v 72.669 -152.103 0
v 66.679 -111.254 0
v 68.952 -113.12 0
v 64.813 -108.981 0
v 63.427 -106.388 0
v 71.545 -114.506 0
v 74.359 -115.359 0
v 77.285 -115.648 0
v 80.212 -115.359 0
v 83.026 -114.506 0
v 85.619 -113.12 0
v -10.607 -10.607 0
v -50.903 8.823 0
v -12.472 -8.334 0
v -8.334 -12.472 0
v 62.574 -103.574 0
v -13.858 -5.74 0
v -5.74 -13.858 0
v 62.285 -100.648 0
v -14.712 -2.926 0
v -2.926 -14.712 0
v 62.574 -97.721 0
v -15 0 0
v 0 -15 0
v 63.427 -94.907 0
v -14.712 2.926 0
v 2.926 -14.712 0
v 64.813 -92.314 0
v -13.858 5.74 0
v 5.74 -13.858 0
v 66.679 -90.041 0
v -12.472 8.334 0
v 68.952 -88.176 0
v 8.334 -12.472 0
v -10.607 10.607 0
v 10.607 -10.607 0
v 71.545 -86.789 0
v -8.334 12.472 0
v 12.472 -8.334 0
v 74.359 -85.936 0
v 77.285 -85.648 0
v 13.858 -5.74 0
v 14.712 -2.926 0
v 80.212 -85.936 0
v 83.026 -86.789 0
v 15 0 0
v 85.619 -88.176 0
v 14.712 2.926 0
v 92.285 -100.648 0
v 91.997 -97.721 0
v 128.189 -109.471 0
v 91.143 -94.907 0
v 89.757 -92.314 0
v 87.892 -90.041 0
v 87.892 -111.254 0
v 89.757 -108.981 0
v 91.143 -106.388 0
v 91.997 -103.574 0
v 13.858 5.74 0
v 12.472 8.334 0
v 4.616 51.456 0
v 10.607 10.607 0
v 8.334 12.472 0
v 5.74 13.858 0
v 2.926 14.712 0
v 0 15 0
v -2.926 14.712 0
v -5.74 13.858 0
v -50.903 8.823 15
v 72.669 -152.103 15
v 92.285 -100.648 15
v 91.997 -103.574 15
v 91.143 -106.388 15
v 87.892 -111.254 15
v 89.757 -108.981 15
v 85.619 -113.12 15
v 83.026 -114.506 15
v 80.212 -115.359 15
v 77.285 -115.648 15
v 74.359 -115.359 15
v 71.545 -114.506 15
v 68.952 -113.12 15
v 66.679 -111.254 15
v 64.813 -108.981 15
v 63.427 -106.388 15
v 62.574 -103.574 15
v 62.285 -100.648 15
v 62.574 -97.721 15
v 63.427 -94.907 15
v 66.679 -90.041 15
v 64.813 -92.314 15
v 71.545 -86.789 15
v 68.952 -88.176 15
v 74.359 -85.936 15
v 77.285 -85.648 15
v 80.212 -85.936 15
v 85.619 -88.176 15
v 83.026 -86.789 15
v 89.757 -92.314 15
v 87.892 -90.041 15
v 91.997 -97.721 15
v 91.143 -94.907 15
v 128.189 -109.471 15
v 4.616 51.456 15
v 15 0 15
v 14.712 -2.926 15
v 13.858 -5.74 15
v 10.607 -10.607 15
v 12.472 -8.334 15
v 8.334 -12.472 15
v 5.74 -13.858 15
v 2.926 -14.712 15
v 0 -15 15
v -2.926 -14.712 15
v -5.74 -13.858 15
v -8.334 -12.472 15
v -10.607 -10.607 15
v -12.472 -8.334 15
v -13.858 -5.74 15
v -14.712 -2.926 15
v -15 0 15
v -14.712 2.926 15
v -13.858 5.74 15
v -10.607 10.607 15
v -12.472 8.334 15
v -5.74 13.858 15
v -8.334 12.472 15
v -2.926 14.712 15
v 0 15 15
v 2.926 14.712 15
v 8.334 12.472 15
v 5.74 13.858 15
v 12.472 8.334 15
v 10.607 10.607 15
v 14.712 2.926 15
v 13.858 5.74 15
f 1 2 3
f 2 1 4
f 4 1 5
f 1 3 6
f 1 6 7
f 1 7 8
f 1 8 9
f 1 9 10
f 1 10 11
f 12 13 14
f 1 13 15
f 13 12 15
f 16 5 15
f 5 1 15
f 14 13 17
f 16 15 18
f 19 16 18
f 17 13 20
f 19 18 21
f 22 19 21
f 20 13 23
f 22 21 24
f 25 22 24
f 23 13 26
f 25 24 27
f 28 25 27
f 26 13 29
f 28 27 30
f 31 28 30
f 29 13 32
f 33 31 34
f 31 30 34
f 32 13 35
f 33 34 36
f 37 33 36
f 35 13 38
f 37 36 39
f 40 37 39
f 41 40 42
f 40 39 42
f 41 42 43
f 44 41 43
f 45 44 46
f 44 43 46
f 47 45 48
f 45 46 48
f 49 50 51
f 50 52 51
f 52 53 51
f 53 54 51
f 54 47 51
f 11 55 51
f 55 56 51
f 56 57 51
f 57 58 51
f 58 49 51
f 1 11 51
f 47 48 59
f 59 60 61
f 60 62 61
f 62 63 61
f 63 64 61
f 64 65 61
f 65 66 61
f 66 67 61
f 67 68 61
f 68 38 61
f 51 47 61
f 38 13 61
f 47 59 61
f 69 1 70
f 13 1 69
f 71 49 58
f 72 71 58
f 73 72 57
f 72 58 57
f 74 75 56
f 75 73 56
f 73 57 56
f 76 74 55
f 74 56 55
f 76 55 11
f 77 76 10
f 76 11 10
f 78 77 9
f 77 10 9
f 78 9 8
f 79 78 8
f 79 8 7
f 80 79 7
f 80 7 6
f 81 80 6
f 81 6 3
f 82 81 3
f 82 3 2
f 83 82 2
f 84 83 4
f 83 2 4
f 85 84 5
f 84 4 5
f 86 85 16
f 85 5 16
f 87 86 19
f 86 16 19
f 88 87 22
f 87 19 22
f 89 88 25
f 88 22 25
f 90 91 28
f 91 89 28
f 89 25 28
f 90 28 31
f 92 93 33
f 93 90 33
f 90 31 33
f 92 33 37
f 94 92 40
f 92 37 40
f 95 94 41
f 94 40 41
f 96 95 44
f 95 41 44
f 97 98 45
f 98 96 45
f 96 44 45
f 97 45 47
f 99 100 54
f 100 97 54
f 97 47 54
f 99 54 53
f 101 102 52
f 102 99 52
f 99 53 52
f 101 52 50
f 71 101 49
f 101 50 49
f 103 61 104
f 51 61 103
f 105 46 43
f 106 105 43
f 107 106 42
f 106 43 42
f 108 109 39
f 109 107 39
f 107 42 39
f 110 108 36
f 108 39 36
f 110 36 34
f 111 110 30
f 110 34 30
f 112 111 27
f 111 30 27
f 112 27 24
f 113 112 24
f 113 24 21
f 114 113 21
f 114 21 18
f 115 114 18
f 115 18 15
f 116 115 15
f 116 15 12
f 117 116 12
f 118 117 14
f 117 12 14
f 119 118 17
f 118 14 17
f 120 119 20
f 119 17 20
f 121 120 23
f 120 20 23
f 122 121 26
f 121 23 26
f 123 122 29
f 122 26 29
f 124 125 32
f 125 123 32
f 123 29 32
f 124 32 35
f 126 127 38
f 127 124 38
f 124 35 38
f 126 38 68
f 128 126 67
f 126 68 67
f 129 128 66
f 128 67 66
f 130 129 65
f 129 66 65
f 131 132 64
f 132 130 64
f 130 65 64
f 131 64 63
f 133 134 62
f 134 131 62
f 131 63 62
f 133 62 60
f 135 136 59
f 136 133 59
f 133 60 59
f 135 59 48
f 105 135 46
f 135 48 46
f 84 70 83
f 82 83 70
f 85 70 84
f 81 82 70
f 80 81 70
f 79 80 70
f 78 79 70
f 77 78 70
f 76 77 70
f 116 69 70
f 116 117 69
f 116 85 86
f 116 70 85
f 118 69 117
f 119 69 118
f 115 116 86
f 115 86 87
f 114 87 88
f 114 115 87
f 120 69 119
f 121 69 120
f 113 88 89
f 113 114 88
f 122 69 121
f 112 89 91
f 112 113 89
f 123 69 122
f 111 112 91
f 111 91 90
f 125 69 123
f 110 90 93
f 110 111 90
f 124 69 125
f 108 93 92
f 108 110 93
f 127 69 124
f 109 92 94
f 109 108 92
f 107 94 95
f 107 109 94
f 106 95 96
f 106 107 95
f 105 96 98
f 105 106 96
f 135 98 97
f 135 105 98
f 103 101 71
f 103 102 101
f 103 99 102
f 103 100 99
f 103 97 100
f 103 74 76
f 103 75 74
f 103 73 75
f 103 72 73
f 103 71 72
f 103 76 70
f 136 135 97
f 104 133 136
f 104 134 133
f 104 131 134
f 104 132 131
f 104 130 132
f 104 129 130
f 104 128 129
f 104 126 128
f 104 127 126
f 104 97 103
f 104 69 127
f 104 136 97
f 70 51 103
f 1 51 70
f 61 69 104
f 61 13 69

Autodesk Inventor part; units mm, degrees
ref_plane "YZ Plane" through (0, 0, 0) normal (1, 0, 0) x (0, 1, 0)
ref_plane "XZ Plane" through (0, 0, 0) normal (0, 1, 0) x (-1, 0, 0)
ref_plane "XY Plane" through (0, 0, 0) normal (0, 0, 1) x (1, 0, 0)
sketch "Sketch1" plane through (0, 0, 0) normal (0, 0, 1) x (1, 0, 0)
  circle A0 centre (0, 0) radius 15 projected
  circle A1 centre (77.2853, -100.6476) radius 15 projected
  line L0 (0, 0) -> (77.2853, -100.6476) construction
  line L1 (4.6165, 51.4557) -> (140.1218, -125.0109) construction
  line L2 (-50.9034, 8.823) -> (49.7593, -122.2685) construction
  line L3 (11.1166, -71.9447) -> (66.6365, -29.312) construction
  line L4 (-50.9034, 8.823) -> (4.6165, 51.4557) construction
  line L5 (82.3144, -169.4001) -> (140.1218, -125.0109) construction
  line L6 (-50.9034, 8.823) -> (4.6165, 51.4557)
  line L7 (4.6165, 51.4557) -> (128.1887, -109.4706)
  line L8 (128.1887, -109.4706) -> (72.6688, -152.1033)
  line L9 (72.6688, -152.1033) -> (-50.9034, 8.823)
  point P0 (0, 0)
  dimension "d0" = 38
  dimension "d1" = 38
  dimension "d2" = 35
  dimension "d3" = 35
extrude "Extrusion1" add sketch "Sketch1" along normal blind 15
properties part number "gantry_y_holder"
